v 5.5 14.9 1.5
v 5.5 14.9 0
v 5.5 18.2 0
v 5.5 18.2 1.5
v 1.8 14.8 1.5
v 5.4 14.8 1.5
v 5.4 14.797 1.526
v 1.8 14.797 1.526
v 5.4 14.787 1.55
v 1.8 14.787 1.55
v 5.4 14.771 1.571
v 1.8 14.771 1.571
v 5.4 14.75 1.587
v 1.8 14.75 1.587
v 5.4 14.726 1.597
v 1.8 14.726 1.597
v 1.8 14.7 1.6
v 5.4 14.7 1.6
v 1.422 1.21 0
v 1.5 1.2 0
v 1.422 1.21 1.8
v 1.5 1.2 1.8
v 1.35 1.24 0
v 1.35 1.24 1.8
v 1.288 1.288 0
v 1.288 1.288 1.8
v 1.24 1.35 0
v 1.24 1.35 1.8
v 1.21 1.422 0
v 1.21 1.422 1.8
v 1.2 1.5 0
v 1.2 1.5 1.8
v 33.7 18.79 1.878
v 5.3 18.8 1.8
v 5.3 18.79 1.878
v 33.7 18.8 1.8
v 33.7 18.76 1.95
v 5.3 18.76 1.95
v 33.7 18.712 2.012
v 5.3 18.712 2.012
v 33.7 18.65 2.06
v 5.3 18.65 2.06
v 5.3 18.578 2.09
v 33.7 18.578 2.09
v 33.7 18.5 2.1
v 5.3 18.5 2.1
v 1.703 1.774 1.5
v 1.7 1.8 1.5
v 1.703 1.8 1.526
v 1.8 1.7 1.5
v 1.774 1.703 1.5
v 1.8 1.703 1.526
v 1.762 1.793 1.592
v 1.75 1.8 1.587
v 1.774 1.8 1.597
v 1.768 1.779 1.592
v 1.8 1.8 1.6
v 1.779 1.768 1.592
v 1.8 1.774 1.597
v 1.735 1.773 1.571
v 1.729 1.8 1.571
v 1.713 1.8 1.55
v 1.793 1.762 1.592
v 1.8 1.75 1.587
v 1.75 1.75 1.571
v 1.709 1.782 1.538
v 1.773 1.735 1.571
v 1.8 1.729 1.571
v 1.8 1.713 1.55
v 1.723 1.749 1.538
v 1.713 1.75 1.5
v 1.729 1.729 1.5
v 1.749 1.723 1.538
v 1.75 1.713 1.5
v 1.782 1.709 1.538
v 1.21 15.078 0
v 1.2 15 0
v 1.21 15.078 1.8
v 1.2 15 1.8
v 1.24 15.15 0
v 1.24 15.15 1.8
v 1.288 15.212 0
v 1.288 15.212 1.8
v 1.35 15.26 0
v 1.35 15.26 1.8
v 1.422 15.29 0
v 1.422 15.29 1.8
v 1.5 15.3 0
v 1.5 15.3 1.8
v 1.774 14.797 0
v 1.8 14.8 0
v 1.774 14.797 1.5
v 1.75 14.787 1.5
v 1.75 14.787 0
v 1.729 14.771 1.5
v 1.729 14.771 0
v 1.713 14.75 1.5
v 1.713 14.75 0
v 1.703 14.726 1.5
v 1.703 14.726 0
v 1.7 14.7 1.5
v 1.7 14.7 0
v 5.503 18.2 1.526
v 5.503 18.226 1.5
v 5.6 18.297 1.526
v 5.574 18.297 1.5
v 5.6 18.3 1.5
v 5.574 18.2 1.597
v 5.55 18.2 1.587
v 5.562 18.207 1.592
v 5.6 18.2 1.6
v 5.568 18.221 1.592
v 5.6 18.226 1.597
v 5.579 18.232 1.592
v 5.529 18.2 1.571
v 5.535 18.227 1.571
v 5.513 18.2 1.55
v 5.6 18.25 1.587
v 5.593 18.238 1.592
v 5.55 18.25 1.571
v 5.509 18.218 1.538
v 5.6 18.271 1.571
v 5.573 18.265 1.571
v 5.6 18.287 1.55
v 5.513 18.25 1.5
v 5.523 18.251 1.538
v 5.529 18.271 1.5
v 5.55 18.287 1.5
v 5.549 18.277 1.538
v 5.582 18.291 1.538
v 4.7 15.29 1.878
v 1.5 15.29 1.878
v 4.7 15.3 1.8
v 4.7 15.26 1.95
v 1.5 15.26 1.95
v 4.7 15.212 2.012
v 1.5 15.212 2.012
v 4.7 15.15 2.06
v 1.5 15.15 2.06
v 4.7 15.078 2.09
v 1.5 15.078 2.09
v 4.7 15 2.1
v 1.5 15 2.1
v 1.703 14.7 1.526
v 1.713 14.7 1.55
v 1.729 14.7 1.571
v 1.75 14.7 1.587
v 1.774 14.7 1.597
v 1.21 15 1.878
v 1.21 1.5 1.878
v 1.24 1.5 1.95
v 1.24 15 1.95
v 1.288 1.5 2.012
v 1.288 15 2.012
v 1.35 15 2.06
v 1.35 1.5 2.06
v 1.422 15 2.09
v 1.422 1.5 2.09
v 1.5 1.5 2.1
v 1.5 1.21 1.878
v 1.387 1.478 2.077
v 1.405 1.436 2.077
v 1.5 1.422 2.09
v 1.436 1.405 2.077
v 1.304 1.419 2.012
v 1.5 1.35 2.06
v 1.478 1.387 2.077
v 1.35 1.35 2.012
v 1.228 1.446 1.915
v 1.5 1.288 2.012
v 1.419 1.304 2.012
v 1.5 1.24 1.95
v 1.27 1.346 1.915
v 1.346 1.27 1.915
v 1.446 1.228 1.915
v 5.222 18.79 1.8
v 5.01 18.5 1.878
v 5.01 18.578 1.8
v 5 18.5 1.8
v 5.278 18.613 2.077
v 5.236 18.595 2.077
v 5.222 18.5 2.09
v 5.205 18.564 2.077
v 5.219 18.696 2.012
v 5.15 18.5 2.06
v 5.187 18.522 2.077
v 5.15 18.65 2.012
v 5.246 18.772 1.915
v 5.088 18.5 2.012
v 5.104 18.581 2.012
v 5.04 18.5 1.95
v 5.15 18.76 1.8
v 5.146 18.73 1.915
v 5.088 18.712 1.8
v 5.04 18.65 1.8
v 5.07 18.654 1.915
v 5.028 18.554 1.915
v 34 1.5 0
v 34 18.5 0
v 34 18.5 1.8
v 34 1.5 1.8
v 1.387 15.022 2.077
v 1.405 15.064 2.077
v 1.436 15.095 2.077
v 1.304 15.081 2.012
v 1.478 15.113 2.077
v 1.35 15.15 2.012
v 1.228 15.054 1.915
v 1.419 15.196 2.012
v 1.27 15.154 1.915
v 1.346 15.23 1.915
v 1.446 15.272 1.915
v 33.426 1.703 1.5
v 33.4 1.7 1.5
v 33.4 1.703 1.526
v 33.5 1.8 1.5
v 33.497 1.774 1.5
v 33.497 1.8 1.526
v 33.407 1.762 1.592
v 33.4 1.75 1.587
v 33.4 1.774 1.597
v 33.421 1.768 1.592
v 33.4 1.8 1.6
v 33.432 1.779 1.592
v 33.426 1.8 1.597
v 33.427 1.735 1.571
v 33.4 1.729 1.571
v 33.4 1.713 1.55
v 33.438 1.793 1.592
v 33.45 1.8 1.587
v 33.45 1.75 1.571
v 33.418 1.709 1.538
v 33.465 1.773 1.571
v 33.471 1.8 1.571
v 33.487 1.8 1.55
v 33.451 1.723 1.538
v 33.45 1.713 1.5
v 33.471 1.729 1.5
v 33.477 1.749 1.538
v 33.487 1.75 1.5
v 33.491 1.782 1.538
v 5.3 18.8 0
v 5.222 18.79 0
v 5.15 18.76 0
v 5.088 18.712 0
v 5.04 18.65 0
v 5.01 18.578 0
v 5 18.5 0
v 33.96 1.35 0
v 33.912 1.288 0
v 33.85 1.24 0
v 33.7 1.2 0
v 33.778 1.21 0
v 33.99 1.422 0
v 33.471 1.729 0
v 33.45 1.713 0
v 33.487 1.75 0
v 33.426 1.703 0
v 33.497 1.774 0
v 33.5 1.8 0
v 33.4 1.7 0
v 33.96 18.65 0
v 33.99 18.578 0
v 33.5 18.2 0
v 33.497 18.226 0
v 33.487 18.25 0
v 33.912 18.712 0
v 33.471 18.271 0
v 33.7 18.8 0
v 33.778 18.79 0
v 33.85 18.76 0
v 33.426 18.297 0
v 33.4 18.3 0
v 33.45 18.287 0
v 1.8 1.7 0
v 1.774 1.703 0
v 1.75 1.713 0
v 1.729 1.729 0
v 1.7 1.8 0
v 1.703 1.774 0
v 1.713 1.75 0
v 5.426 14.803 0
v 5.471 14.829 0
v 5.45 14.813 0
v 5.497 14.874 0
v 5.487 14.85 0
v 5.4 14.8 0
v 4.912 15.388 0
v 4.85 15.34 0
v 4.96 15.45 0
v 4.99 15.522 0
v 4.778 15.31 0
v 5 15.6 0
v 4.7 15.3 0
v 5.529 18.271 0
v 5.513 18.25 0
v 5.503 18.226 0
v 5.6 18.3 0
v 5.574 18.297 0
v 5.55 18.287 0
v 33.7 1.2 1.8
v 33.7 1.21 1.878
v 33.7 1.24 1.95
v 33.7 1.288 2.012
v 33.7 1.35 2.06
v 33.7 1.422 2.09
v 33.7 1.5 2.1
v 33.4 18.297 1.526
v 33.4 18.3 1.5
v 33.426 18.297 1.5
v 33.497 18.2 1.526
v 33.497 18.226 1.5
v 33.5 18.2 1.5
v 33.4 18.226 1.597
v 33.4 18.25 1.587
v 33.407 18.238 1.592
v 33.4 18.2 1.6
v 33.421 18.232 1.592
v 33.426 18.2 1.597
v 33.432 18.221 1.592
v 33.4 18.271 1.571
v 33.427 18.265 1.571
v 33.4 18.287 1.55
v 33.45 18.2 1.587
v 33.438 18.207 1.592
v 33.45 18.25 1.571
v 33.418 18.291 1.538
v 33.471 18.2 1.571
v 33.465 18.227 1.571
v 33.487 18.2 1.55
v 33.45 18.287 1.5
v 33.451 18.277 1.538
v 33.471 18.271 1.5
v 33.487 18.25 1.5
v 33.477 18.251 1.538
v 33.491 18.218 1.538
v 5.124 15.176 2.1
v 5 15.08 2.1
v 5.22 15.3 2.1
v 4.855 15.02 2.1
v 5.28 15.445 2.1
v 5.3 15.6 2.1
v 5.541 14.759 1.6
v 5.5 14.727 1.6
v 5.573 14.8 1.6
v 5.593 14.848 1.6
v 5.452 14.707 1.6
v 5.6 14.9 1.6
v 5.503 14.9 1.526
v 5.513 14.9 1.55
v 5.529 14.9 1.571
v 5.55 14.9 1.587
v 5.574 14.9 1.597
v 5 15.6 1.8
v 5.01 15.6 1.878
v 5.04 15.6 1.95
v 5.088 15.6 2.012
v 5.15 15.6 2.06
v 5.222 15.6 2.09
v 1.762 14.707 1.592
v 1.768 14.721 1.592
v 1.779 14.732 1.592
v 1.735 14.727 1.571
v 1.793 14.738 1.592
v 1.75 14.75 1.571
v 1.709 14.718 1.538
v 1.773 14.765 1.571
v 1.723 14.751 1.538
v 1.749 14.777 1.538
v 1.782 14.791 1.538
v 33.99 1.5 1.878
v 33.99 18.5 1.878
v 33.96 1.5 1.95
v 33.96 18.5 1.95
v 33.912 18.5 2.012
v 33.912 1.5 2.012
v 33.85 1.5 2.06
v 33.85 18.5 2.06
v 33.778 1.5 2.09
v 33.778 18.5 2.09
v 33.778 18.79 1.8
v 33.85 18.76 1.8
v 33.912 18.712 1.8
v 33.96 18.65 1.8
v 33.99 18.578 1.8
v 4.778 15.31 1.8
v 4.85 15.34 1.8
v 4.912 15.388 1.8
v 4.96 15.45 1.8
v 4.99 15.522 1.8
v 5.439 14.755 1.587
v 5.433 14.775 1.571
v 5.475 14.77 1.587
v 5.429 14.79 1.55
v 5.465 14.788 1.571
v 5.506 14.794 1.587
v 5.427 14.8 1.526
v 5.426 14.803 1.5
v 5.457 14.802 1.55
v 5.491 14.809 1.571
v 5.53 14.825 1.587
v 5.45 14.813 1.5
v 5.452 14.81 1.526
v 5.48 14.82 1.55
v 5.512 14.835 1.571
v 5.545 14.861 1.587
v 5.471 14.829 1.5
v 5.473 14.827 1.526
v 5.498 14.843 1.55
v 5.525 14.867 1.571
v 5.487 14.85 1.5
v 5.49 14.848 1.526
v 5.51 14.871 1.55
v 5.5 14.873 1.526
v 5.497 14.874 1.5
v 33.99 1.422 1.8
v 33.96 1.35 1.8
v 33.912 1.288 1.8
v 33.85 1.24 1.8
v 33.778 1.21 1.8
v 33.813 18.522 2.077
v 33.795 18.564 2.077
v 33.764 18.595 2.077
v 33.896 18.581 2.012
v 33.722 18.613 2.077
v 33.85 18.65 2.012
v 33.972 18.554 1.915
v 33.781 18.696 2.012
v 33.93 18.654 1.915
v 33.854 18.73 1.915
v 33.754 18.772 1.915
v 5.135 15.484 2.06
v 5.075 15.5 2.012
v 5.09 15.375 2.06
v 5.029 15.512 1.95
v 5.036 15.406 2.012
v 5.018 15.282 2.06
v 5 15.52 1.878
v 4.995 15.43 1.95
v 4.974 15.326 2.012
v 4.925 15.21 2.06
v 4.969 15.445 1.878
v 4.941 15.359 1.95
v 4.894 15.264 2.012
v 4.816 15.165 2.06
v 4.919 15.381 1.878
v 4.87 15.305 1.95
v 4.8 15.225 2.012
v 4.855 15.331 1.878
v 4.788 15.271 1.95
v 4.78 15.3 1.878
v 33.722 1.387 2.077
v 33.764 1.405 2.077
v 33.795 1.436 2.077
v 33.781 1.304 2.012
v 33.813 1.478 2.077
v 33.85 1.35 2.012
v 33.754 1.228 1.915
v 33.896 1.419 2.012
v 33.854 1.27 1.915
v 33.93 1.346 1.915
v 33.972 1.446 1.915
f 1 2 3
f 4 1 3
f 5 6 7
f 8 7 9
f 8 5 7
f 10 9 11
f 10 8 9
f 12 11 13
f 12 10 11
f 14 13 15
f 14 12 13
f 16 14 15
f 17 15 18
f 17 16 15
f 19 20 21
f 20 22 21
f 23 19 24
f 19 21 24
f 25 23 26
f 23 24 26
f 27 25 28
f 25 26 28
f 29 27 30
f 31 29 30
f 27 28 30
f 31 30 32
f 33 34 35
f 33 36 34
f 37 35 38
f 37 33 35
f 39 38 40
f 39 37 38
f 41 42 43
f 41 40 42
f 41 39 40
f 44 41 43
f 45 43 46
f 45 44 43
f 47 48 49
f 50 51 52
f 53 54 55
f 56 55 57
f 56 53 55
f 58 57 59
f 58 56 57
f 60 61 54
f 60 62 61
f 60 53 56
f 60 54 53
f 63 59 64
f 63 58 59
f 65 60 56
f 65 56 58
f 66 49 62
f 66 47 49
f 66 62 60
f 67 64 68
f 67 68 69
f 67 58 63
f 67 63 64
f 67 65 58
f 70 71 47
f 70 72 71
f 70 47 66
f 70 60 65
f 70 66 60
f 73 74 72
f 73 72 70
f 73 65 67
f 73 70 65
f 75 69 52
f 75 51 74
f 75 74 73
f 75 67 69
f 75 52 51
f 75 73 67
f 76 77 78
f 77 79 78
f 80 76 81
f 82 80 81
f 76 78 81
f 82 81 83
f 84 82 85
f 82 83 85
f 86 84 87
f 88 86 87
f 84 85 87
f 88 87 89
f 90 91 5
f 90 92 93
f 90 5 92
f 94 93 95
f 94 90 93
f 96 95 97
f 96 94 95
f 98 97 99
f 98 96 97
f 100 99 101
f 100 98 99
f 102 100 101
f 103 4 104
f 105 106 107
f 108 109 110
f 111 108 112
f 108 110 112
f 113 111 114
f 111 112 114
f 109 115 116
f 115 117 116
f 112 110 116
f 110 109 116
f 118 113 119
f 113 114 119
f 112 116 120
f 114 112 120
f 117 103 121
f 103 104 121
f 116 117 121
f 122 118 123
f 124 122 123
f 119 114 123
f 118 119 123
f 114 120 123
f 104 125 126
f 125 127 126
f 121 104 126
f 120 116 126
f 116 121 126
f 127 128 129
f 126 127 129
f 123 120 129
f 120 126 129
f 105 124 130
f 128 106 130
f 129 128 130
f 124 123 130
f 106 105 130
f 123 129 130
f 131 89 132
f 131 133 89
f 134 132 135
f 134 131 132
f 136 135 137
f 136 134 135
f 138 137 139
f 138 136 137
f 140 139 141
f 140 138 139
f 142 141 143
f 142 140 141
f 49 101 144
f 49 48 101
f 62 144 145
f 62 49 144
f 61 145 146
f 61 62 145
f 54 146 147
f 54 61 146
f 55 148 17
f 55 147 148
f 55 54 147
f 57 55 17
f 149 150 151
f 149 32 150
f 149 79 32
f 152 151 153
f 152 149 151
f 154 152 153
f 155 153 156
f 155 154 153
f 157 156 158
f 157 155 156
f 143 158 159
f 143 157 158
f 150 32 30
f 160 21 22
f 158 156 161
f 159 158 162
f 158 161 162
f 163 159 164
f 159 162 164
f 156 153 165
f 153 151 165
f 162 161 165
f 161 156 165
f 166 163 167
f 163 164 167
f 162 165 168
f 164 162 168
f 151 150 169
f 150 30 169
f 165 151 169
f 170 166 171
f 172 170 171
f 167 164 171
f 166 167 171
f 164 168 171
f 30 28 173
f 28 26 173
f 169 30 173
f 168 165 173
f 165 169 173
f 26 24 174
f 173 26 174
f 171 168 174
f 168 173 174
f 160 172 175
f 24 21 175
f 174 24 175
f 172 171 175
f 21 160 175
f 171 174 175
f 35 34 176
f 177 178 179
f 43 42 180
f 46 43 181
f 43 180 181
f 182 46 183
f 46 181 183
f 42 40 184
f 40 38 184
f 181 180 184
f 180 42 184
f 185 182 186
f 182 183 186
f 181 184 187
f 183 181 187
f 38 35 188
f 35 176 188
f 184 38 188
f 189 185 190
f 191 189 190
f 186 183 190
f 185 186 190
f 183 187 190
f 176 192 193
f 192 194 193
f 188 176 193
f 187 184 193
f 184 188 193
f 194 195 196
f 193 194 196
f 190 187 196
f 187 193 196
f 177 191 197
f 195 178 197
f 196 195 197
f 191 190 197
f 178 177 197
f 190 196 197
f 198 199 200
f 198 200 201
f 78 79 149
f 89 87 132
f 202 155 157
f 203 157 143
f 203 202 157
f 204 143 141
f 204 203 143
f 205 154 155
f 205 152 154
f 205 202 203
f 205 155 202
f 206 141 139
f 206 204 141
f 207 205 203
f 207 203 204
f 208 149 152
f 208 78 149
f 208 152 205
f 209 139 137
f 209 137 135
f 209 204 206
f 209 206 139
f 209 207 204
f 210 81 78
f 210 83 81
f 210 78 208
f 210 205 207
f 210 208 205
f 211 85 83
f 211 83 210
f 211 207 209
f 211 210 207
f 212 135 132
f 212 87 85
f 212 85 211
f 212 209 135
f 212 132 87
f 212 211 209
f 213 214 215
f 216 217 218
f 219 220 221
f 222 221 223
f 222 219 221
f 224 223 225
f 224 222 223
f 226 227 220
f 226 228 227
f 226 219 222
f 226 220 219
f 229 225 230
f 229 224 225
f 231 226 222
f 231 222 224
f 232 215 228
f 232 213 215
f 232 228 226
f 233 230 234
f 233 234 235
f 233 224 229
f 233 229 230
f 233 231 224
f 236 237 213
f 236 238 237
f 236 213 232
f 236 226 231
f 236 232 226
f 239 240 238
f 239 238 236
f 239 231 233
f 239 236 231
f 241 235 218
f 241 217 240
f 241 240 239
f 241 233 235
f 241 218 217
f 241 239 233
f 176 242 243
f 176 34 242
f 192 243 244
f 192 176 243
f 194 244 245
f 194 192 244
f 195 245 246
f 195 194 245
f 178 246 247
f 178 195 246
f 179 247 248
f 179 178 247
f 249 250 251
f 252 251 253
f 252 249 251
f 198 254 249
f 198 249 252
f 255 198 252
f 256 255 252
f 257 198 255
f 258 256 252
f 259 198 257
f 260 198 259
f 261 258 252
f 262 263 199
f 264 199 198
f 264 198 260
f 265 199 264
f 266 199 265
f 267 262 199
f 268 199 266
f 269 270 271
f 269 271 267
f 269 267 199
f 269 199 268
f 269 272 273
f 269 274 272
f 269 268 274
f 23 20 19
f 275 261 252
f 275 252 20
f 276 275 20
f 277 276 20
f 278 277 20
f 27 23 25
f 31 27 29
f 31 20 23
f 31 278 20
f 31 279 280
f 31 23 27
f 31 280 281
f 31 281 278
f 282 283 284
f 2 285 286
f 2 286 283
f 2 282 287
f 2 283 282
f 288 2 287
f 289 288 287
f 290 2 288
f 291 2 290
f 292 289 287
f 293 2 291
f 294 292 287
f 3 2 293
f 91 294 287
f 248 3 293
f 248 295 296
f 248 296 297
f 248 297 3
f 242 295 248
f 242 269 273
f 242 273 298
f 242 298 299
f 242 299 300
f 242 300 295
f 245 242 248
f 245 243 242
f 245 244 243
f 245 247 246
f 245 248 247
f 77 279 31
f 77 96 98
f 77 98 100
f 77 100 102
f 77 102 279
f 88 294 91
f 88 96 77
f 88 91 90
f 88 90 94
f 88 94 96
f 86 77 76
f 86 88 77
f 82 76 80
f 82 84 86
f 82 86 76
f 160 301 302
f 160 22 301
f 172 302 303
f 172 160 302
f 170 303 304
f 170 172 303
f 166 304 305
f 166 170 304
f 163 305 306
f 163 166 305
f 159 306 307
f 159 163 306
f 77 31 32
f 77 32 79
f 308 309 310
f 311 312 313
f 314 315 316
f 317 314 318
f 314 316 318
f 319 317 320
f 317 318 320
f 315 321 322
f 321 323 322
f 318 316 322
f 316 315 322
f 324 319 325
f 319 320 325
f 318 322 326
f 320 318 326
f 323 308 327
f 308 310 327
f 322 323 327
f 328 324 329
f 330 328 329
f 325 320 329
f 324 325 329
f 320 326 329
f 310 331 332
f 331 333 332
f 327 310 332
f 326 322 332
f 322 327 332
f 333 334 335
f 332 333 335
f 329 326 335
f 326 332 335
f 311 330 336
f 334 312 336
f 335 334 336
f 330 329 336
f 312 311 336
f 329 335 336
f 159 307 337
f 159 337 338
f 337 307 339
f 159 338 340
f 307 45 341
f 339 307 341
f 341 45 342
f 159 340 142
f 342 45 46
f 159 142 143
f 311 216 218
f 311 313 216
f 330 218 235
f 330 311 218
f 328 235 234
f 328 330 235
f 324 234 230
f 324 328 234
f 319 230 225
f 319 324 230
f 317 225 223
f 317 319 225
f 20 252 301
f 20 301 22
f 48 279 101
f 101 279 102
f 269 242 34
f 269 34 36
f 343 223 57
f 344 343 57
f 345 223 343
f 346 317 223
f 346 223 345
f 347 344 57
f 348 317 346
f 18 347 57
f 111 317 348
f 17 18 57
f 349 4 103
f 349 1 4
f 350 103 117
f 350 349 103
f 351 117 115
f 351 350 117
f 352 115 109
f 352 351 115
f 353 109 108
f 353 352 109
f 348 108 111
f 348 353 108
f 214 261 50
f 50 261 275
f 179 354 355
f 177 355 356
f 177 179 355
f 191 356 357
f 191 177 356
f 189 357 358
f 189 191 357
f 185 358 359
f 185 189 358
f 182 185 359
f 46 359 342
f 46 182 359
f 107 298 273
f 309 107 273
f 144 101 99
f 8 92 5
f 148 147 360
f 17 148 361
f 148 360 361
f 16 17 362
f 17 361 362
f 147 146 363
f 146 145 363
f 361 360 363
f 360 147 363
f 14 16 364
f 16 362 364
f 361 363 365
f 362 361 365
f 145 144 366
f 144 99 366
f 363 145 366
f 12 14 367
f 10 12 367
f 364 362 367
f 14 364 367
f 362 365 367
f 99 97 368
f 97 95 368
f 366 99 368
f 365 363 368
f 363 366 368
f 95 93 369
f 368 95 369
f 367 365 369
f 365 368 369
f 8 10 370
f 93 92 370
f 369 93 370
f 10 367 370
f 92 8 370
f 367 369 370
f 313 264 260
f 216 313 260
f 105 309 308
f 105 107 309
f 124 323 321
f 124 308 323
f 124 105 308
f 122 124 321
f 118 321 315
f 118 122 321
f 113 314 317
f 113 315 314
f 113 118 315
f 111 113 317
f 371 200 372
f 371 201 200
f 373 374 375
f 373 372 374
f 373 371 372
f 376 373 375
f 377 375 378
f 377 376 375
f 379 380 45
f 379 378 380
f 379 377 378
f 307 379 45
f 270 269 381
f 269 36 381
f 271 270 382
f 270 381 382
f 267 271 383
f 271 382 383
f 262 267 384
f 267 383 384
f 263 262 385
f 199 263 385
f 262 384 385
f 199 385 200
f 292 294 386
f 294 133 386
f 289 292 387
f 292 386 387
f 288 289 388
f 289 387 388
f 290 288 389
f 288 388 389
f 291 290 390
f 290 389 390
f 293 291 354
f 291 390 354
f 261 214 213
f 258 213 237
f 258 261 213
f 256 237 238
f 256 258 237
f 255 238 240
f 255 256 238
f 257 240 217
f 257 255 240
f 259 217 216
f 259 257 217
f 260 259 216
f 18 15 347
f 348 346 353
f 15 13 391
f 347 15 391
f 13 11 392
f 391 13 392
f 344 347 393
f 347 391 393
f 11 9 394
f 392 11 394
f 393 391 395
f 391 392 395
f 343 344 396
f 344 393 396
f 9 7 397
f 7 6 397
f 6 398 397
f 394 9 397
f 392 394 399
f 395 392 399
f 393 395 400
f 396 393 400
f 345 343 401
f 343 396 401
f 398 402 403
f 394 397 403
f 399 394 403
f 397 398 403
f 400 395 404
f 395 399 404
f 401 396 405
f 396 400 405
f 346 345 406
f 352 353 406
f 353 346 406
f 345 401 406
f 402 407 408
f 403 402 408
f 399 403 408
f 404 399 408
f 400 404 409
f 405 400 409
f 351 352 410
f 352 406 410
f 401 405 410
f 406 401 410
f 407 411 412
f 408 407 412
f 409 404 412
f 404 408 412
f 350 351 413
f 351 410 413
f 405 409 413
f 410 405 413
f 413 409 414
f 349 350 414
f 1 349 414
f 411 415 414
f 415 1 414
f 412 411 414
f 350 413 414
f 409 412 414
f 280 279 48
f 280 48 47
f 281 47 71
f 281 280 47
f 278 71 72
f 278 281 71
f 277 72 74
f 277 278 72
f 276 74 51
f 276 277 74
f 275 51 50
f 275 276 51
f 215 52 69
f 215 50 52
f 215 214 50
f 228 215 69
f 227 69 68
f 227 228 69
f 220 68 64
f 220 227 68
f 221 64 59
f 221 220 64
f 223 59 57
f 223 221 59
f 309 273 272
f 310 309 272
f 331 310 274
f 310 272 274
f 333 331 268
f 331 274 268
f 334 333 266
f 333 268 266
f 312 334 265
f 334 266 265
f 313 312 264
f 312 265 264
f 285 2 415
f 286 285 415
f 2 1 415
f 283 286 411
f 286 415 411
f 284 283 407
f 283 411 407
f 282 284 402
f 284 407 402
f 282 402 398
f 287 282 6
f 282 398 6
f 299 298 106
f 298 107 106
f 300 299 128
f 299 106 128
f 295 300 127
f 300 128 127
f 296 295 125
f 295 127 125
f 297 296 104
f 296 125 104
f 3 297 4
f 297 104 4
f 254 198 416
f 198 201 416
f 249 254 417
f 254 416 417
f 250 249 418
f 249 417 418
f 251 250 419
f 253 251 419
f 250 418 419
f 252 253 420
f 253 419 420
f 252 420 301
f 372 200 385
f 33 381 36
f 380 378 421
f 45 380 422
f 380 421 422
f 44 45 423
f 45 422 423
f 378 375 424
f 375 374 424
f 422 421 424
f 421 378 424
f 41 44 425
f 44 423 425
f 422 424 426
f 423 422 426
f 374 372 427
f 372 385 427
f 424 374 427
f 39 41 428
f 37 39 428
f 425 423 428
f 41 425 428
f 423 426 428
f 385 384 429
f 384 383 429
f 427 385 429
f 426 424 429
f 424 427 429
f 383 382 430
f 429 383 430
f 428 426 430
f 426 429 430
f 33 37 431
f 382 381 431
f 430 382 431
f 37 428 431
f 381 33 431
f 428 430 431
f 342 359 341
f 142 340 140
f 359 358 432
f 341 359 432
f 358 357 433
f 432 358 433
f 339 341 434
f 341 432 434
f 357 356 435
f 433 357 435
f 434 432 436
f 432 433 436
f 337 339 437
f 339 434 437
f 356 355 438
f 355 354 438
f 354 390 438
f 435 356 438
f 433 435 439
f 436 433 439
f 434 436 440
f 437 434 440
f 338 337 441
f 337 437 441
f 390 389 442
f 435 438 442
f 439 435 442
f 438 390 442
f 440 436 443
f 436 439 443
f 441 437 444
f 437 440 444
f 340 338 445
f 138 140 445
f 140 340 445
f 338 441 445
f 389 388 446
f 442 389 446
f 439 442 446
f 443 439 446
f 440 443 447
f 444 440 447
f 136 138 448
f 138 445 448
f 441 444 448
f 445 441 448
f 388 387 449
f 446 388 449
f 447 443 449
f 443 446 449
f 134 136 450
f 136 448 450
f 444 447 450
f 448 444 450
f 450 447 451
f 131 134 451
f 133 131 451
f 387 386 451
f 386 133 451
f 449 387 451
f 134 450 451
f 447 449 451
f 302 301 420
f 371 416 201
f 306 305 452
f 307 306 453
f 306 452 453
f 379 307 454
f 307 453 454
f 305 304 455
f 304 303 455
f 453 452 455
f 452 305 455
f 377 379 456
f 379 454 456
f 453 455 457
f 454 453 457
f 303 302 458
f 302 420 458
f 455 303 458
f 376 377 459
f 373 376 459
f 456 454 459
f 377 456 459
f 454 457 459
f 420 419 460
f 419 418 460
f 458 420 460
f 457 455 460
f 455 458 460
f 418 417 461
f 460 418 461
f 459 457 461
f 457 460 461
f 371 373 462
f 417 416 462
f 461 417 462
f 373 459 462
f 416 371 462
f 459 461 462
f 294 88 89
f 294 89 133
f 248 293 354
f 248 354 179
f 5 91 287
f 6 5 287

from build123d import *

# Parameters (mm, degrees)
PAD001_DEPTH = 2.1
THICKNESS_T  = -0.5
FILLET_R     = 0.3
FILLET001_R  = 0.1


with BuildPart() as part:
    # Sketch001 → Pad001 (new body)
    with BuildSketch(Plane.XY):
        Polygon((5, 18.8), (34, 18.8), (34, 1.2), (1.2, 1.2), (1.2, 15.3), (5, 15.3), align=None)
    extrude(amount=PAD001_DEPTH)

    # Thickness
    thickness_openings = [part.faces().sort_by_distance(p)[0] for p in [
        (17.941945, 9.833744, 0),
    ]]
    offset(amount=THICKNESS_T, openings=thickness_openings, kind=Kind.INTERSECTION)

    # Fillet
    fillet_edges = [part.edges().sort_by_distance(p)[0] for p in [
        (1.2, 1.2, 1.05),
        (34, 1.2, 1.05),
        (34, 18.8, 1.05),
        (5, 18.8, 1.05),
        (5, 15.3, 1.05),
        (1.2, 15.3, 1.05),
        (1.2, 8.25, 2.1),
        (17.6, 1.2, 2.1),
        (34, 10, 2.1),
        (19.5, 18.8, 2.1),
        (5, 17.05, 2.1),
        (3.1, 15.3, 2.1),
    ]]
    fillet(fillet_edges, radius=FILLET_R)

    # Fillet001
    fillet001_edges = [part.edges().sort_by_distance(p)[0] for p in [
        (1.7, 1.7, 0.8),
        (33.5, 1.7, 0.8),
        (33.5, 18.3, 0.8),
        (5.5, 18.3, 0.8),
        (5.5, 14.8, 0.8),
        (1.7, 14.8, 0.8),
        (1.7, 8.25, 1.6),
        (3.6, 14.8, 1.6),
        (5.5, 16.55, 1.6),
        (19.5, 18.3, 1.6),
        (17.6, 1.7, 1.6),
        (33.5, 10, 1.6),
    ]]
    fillet(fillet001_edges, radius=FILLET001_R)


solid = part.part
